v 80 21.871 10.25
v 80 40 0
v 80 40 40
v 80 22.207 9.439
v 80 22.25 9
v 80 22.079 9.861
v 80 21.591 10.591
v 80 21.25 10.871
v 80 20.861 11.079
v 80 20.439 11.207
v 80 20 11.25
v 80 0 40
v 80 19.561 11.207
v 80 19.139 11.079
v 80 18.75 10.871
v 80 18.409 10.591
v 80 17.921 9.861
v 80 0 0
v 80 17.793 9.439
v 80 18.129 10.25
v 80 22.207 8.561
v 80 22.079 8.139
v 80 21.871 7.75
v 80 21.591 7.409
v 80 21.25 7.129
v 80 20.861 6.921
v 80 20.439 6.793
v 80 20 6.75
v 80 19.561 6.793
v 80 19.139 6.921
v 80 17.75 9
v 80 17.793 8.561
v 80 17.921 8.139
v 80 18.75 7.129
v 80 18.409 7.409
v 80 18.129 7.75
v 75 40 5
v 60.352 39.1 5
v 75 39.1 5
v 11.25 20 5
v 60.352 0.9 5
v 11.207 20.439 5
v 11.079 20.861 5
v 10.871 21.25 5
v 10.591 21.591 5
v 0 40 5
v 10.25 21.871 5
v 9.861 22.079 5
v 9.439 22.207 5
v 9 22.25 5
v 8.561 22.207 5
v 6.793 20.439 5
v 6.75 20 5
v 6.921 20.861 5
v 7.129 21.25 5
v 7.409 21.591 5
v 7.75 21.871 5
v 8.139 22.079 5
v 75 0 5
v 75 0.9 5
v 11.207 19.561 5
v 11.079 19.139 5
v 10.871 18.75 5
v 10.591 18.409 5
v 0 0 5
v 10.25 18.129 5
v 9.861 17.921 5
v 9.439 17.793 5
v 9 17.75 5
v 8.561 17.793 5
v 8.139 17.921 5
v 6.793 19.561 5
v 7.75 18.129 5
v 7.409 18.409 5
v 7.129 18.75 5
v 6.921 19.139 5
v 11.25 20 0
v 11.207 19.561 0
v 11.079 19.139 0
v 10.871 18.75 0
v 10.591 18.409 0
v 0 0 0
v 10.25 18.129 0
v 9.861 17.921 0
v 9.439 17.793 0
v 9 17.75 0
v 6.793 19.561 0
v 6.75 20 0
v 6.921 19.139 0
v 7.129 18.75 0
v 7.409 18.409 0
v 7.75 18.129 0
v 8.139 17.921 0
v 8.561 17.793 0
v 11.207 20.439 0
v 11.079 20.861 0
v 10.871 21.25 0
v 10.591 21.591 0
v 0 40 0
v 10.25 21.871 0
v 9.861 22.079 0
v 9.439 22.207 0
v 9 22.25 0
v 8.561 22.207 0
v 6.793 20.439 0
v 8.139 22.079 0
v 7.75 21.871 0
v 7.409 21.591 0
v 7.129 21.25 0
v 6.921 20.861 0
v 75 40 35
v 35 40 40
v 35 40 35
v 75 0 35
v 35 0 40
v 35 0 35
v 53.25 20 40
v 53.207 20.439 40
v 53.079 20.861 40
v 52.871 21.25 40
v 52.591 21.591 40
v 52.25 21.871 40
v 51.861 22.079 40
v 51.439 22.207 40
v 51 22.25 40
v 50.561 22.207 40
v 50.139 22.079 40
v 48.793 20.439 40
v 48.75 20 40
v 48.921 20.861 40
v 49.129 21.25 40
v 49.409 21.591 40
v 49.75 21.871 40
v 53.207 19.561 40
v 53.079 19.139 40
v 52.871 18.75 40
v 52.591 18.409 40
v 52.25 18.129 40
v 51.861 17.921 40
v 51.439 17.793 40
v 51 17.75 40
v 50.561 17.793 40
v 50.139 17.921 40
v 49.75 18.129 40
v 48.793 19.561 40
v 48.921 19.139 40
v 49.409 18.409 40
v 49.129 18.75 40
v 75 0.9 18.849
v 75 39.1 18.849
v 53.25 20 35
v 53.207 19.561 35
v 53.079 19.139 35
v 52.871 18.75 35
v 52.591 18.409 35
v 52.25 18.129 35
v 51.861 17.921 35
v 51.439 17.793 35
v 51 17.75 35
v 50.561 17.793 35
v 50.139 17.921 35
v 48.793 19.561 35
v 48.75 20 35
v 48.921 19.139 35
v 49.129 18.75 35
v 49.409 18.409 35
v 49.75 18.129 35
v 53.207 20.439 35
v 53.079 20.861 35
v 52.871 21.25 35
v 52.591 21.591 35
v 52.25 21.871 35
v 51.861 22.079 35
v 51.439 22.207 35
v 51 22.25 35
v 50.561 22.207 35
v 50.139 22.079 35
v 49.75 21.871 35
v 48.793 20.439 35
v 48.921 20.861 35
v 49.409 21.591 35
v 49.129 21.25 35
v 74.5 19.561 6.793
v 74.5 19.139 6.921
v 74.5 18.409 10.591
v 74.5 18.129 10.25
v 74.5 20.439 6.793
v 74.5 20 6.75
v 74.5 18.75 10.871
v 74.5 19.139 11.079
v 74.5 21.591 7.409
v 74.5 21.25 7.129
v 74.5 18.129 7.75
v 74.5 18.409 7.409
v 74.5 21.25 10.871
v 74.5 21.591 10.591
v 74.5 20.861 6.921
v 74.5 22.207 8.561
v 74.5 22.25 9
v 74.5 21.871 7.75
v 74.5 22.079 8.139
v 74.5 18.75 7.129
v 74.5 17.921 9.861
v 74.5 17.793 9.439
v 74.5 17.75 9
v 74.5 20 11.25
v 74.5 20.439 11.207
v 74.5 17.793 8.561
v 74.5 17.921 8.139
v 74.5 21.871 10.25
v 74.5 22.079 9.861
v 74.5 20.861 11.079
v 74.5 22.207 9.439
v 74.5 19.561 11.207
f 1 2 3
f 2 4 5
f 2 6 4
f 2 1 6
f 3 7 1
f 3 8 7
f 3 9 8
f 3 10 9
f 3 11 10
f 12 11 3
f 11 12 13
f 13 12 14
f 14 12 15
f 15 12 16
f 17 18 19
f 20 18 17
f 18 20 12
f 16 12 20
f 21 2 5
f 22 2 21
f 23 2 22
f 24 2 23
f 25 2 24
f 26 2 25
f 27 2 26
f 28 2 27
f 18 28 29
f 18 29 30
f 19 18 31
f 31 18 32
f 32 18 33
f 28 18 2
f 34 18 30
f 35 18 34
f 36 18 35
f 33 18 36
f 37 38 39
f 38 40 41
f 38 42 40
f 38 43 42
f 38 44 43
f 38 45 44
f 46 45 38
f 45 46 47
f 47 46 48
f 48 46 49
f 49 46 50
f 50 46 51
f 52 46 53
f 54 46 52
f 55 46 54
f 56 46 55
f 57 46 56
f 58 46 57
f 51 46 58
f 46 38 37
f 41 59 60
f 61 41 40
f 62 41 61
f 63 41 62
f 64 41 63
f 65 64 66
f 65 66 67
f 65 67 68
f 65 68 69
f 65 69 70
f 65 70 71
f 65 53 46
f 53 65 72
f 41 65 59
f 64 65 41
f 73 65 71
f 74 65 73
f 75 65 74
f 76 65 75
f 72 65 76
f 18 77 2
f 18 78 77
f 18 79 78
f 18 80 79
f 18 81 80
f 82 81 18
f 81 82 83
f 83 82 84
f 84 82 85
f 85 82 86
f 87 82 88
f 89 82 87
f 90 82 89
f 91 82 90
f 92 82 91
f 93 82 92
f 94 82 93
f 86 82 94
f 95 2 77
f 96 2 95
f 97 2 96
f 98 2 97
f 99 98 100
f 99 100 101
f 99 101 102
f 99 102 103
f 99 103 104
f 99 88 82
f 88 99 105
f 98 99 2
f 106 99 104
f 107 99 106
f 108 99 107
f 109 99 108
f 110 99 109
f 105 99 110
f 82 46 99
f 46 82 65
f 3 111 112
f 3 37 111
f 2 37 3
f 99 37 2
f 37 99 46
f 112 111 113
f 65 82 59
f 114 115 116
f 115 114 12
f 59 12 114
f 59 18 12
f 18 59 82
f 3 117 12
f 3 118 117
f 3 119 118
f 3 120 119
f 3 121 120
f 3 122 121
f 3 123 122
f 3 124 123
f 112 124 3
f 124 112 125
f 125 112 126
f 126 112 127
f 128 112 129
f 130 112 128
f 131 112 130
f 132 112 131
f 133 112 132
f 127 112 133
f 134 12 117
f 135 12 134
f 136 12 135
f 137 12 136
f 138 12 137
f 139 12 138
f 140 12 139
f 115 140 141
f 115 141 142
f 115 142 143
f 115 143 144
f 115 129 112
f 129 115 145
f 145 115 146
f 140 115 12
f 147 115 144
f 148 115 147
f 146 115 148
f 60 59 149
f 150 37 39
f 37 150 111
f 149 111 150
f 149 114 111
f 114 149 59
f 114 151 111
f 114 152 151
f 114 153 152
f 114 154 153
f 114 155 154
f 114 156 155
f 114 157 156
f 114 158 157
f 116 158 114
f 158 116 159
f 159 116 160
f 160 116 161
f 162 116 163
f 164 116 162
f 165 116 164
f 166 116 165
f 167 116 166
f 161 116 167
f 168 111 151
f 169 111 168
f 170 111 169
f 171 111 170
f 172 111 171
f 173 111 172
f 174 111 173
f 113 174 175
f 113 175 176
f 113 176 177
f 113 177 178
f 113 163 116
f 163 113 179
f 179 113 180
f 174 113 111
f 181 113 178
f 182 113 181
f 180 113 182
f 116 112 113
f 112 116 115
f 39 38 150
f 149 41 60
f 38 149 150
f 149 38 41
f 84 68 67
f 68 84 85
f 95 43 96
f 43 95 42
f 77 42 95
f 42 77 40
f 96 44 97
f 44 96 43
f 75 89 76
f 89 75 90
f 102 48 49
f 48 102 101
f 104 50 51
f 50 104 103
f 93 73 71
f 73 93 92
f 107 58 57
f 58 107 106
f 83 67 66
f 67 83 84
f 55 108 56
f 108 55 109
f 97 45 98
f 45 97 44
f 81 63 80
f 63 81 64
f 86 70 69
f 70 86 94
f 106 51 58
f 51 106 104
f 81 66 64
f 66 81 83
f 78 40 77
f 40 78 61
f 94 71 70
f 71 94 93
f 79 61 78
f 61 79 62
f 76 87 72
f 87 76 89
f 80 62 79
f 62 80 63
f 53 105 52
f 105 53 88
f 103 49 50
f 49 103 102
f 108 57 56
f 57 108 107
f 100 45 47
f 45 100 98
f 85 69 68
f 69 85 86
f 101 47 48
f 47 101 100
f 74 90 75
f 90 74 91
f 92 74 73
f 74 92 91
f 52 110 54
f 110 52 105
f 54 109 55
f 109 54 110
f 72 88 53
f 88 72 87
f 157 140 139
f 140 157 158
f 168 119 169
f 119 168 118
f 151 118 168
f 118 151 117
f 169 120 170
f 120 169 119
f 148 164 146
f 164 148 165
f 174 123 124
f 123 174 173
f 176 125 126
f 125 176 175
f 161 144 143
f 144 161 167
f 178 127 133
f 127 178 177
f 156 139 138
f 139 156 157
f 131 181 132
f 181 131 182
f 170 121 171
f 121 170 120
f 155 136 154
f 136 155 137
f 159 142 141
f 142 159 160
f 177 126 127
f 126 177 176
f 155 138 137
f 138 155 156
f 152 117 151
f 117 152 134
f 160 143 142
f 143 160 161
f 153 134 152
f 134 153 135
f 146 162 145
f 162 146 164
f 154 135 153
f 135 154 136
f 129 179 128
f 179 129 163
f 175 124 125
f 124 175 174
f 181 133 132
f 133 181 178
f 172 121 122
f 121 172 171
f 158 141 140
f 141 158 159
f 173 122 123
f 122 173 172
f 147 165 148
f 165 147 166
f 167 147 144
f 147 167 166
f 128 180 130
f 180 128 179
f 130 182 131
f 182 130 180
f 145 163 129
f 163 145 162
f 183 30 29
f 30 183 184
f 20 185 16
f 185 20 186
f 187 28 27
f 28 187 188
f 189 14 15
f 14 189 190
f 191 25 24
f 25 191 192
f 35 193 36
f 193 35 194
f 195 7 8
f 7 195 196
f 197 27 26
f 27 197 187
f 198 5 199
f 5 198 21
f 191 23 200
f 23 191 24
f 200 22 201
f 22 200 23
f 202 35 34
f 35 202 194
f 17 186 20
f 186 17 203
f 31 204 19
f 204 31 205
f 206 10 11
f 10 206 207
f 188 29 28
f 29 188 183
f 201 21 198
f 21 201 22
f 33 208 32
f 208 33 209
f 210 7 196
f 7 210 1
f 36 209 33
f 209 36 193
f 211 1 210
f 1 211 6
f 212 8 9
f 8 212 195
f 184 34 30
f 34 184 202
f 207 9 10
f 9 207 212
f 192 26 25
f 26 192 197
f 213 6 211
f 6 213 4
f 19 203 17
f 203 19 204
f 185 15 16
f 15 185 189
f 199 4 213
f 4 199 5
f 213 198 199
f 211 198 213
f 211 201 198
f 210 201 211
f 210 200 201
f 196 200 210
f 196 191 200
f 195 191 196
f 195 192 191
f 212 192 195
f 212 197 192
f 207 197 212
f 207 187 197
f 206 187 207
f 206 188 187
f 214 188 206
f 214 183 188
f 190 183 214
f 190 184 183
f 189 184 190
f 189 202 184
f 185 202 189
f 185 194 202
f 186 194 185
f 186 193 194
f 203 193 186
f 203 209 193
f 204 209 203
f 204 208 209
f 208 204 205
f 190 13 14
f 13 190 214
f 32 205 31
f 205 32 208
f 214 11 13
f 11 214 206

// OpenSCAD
$fn = 32;

// ----------------------------------------------------------------------
// Z-bracket: 80 x 40 x 40 mm
// ----------------------------------------------------------------------

// --- parameters (mm) ---
lower_len = 80;           // lower foot length, X
upper_len = 40;           // upper foot length, X
width = 40;               // bracket width, Y
rise = 40;                // overall rise, Z
thick = 5;                // plate thickness
hole_d = 4.5;             // clearance for M4
rib_len = 15.6;           // gusset leg
rib_sink = 0.9;           // gusset overlap into the plates

module hole_z(px, py, z0) {
  translate([px, py, z0 - 0.5]) cylinder(h = thick + 1, d = hole_d);
}
module hole_x(py, pz) {
  translate([-0.5, py, pz]) rotate([0, 90, 0]) cylinder(h = thick + 1, d = hole_d);
}
module gusset(x0) {
  translate([x0, width - rib_sink, 0])
    rotate([90, 0, 0])
      linear_extrude(height = width - 2 * rib_sink)
        polygon(points = [[rib_sink, thick - rib_sink],
                          [rib_sink, thick - rib_sink + rib_len],
                          [-rib_len, thick - rib_sink]]);
}

difference() {
  union() {
    cube([lower_len, width, thick]);
    /* web, overlapping the lower foot */
    translate([lower_len - thick, 0, 0]) cube([thick, width, rise]);
    /* upper foot, sunk into the web */
    translate([lower_len - thick - upper_len, 0, rise - thick]) cube([upper_len + thick, width, thick]);
    gusset(lower_len - thick);
  }
  hole_z(9, 20, 0);
  translate([lower_len - thick - 24, 0, 0]) hole_z(0, 20, rise - thick);
  translate([lower_len - thick, 0, 0]) hole_x(20, 9);
}
